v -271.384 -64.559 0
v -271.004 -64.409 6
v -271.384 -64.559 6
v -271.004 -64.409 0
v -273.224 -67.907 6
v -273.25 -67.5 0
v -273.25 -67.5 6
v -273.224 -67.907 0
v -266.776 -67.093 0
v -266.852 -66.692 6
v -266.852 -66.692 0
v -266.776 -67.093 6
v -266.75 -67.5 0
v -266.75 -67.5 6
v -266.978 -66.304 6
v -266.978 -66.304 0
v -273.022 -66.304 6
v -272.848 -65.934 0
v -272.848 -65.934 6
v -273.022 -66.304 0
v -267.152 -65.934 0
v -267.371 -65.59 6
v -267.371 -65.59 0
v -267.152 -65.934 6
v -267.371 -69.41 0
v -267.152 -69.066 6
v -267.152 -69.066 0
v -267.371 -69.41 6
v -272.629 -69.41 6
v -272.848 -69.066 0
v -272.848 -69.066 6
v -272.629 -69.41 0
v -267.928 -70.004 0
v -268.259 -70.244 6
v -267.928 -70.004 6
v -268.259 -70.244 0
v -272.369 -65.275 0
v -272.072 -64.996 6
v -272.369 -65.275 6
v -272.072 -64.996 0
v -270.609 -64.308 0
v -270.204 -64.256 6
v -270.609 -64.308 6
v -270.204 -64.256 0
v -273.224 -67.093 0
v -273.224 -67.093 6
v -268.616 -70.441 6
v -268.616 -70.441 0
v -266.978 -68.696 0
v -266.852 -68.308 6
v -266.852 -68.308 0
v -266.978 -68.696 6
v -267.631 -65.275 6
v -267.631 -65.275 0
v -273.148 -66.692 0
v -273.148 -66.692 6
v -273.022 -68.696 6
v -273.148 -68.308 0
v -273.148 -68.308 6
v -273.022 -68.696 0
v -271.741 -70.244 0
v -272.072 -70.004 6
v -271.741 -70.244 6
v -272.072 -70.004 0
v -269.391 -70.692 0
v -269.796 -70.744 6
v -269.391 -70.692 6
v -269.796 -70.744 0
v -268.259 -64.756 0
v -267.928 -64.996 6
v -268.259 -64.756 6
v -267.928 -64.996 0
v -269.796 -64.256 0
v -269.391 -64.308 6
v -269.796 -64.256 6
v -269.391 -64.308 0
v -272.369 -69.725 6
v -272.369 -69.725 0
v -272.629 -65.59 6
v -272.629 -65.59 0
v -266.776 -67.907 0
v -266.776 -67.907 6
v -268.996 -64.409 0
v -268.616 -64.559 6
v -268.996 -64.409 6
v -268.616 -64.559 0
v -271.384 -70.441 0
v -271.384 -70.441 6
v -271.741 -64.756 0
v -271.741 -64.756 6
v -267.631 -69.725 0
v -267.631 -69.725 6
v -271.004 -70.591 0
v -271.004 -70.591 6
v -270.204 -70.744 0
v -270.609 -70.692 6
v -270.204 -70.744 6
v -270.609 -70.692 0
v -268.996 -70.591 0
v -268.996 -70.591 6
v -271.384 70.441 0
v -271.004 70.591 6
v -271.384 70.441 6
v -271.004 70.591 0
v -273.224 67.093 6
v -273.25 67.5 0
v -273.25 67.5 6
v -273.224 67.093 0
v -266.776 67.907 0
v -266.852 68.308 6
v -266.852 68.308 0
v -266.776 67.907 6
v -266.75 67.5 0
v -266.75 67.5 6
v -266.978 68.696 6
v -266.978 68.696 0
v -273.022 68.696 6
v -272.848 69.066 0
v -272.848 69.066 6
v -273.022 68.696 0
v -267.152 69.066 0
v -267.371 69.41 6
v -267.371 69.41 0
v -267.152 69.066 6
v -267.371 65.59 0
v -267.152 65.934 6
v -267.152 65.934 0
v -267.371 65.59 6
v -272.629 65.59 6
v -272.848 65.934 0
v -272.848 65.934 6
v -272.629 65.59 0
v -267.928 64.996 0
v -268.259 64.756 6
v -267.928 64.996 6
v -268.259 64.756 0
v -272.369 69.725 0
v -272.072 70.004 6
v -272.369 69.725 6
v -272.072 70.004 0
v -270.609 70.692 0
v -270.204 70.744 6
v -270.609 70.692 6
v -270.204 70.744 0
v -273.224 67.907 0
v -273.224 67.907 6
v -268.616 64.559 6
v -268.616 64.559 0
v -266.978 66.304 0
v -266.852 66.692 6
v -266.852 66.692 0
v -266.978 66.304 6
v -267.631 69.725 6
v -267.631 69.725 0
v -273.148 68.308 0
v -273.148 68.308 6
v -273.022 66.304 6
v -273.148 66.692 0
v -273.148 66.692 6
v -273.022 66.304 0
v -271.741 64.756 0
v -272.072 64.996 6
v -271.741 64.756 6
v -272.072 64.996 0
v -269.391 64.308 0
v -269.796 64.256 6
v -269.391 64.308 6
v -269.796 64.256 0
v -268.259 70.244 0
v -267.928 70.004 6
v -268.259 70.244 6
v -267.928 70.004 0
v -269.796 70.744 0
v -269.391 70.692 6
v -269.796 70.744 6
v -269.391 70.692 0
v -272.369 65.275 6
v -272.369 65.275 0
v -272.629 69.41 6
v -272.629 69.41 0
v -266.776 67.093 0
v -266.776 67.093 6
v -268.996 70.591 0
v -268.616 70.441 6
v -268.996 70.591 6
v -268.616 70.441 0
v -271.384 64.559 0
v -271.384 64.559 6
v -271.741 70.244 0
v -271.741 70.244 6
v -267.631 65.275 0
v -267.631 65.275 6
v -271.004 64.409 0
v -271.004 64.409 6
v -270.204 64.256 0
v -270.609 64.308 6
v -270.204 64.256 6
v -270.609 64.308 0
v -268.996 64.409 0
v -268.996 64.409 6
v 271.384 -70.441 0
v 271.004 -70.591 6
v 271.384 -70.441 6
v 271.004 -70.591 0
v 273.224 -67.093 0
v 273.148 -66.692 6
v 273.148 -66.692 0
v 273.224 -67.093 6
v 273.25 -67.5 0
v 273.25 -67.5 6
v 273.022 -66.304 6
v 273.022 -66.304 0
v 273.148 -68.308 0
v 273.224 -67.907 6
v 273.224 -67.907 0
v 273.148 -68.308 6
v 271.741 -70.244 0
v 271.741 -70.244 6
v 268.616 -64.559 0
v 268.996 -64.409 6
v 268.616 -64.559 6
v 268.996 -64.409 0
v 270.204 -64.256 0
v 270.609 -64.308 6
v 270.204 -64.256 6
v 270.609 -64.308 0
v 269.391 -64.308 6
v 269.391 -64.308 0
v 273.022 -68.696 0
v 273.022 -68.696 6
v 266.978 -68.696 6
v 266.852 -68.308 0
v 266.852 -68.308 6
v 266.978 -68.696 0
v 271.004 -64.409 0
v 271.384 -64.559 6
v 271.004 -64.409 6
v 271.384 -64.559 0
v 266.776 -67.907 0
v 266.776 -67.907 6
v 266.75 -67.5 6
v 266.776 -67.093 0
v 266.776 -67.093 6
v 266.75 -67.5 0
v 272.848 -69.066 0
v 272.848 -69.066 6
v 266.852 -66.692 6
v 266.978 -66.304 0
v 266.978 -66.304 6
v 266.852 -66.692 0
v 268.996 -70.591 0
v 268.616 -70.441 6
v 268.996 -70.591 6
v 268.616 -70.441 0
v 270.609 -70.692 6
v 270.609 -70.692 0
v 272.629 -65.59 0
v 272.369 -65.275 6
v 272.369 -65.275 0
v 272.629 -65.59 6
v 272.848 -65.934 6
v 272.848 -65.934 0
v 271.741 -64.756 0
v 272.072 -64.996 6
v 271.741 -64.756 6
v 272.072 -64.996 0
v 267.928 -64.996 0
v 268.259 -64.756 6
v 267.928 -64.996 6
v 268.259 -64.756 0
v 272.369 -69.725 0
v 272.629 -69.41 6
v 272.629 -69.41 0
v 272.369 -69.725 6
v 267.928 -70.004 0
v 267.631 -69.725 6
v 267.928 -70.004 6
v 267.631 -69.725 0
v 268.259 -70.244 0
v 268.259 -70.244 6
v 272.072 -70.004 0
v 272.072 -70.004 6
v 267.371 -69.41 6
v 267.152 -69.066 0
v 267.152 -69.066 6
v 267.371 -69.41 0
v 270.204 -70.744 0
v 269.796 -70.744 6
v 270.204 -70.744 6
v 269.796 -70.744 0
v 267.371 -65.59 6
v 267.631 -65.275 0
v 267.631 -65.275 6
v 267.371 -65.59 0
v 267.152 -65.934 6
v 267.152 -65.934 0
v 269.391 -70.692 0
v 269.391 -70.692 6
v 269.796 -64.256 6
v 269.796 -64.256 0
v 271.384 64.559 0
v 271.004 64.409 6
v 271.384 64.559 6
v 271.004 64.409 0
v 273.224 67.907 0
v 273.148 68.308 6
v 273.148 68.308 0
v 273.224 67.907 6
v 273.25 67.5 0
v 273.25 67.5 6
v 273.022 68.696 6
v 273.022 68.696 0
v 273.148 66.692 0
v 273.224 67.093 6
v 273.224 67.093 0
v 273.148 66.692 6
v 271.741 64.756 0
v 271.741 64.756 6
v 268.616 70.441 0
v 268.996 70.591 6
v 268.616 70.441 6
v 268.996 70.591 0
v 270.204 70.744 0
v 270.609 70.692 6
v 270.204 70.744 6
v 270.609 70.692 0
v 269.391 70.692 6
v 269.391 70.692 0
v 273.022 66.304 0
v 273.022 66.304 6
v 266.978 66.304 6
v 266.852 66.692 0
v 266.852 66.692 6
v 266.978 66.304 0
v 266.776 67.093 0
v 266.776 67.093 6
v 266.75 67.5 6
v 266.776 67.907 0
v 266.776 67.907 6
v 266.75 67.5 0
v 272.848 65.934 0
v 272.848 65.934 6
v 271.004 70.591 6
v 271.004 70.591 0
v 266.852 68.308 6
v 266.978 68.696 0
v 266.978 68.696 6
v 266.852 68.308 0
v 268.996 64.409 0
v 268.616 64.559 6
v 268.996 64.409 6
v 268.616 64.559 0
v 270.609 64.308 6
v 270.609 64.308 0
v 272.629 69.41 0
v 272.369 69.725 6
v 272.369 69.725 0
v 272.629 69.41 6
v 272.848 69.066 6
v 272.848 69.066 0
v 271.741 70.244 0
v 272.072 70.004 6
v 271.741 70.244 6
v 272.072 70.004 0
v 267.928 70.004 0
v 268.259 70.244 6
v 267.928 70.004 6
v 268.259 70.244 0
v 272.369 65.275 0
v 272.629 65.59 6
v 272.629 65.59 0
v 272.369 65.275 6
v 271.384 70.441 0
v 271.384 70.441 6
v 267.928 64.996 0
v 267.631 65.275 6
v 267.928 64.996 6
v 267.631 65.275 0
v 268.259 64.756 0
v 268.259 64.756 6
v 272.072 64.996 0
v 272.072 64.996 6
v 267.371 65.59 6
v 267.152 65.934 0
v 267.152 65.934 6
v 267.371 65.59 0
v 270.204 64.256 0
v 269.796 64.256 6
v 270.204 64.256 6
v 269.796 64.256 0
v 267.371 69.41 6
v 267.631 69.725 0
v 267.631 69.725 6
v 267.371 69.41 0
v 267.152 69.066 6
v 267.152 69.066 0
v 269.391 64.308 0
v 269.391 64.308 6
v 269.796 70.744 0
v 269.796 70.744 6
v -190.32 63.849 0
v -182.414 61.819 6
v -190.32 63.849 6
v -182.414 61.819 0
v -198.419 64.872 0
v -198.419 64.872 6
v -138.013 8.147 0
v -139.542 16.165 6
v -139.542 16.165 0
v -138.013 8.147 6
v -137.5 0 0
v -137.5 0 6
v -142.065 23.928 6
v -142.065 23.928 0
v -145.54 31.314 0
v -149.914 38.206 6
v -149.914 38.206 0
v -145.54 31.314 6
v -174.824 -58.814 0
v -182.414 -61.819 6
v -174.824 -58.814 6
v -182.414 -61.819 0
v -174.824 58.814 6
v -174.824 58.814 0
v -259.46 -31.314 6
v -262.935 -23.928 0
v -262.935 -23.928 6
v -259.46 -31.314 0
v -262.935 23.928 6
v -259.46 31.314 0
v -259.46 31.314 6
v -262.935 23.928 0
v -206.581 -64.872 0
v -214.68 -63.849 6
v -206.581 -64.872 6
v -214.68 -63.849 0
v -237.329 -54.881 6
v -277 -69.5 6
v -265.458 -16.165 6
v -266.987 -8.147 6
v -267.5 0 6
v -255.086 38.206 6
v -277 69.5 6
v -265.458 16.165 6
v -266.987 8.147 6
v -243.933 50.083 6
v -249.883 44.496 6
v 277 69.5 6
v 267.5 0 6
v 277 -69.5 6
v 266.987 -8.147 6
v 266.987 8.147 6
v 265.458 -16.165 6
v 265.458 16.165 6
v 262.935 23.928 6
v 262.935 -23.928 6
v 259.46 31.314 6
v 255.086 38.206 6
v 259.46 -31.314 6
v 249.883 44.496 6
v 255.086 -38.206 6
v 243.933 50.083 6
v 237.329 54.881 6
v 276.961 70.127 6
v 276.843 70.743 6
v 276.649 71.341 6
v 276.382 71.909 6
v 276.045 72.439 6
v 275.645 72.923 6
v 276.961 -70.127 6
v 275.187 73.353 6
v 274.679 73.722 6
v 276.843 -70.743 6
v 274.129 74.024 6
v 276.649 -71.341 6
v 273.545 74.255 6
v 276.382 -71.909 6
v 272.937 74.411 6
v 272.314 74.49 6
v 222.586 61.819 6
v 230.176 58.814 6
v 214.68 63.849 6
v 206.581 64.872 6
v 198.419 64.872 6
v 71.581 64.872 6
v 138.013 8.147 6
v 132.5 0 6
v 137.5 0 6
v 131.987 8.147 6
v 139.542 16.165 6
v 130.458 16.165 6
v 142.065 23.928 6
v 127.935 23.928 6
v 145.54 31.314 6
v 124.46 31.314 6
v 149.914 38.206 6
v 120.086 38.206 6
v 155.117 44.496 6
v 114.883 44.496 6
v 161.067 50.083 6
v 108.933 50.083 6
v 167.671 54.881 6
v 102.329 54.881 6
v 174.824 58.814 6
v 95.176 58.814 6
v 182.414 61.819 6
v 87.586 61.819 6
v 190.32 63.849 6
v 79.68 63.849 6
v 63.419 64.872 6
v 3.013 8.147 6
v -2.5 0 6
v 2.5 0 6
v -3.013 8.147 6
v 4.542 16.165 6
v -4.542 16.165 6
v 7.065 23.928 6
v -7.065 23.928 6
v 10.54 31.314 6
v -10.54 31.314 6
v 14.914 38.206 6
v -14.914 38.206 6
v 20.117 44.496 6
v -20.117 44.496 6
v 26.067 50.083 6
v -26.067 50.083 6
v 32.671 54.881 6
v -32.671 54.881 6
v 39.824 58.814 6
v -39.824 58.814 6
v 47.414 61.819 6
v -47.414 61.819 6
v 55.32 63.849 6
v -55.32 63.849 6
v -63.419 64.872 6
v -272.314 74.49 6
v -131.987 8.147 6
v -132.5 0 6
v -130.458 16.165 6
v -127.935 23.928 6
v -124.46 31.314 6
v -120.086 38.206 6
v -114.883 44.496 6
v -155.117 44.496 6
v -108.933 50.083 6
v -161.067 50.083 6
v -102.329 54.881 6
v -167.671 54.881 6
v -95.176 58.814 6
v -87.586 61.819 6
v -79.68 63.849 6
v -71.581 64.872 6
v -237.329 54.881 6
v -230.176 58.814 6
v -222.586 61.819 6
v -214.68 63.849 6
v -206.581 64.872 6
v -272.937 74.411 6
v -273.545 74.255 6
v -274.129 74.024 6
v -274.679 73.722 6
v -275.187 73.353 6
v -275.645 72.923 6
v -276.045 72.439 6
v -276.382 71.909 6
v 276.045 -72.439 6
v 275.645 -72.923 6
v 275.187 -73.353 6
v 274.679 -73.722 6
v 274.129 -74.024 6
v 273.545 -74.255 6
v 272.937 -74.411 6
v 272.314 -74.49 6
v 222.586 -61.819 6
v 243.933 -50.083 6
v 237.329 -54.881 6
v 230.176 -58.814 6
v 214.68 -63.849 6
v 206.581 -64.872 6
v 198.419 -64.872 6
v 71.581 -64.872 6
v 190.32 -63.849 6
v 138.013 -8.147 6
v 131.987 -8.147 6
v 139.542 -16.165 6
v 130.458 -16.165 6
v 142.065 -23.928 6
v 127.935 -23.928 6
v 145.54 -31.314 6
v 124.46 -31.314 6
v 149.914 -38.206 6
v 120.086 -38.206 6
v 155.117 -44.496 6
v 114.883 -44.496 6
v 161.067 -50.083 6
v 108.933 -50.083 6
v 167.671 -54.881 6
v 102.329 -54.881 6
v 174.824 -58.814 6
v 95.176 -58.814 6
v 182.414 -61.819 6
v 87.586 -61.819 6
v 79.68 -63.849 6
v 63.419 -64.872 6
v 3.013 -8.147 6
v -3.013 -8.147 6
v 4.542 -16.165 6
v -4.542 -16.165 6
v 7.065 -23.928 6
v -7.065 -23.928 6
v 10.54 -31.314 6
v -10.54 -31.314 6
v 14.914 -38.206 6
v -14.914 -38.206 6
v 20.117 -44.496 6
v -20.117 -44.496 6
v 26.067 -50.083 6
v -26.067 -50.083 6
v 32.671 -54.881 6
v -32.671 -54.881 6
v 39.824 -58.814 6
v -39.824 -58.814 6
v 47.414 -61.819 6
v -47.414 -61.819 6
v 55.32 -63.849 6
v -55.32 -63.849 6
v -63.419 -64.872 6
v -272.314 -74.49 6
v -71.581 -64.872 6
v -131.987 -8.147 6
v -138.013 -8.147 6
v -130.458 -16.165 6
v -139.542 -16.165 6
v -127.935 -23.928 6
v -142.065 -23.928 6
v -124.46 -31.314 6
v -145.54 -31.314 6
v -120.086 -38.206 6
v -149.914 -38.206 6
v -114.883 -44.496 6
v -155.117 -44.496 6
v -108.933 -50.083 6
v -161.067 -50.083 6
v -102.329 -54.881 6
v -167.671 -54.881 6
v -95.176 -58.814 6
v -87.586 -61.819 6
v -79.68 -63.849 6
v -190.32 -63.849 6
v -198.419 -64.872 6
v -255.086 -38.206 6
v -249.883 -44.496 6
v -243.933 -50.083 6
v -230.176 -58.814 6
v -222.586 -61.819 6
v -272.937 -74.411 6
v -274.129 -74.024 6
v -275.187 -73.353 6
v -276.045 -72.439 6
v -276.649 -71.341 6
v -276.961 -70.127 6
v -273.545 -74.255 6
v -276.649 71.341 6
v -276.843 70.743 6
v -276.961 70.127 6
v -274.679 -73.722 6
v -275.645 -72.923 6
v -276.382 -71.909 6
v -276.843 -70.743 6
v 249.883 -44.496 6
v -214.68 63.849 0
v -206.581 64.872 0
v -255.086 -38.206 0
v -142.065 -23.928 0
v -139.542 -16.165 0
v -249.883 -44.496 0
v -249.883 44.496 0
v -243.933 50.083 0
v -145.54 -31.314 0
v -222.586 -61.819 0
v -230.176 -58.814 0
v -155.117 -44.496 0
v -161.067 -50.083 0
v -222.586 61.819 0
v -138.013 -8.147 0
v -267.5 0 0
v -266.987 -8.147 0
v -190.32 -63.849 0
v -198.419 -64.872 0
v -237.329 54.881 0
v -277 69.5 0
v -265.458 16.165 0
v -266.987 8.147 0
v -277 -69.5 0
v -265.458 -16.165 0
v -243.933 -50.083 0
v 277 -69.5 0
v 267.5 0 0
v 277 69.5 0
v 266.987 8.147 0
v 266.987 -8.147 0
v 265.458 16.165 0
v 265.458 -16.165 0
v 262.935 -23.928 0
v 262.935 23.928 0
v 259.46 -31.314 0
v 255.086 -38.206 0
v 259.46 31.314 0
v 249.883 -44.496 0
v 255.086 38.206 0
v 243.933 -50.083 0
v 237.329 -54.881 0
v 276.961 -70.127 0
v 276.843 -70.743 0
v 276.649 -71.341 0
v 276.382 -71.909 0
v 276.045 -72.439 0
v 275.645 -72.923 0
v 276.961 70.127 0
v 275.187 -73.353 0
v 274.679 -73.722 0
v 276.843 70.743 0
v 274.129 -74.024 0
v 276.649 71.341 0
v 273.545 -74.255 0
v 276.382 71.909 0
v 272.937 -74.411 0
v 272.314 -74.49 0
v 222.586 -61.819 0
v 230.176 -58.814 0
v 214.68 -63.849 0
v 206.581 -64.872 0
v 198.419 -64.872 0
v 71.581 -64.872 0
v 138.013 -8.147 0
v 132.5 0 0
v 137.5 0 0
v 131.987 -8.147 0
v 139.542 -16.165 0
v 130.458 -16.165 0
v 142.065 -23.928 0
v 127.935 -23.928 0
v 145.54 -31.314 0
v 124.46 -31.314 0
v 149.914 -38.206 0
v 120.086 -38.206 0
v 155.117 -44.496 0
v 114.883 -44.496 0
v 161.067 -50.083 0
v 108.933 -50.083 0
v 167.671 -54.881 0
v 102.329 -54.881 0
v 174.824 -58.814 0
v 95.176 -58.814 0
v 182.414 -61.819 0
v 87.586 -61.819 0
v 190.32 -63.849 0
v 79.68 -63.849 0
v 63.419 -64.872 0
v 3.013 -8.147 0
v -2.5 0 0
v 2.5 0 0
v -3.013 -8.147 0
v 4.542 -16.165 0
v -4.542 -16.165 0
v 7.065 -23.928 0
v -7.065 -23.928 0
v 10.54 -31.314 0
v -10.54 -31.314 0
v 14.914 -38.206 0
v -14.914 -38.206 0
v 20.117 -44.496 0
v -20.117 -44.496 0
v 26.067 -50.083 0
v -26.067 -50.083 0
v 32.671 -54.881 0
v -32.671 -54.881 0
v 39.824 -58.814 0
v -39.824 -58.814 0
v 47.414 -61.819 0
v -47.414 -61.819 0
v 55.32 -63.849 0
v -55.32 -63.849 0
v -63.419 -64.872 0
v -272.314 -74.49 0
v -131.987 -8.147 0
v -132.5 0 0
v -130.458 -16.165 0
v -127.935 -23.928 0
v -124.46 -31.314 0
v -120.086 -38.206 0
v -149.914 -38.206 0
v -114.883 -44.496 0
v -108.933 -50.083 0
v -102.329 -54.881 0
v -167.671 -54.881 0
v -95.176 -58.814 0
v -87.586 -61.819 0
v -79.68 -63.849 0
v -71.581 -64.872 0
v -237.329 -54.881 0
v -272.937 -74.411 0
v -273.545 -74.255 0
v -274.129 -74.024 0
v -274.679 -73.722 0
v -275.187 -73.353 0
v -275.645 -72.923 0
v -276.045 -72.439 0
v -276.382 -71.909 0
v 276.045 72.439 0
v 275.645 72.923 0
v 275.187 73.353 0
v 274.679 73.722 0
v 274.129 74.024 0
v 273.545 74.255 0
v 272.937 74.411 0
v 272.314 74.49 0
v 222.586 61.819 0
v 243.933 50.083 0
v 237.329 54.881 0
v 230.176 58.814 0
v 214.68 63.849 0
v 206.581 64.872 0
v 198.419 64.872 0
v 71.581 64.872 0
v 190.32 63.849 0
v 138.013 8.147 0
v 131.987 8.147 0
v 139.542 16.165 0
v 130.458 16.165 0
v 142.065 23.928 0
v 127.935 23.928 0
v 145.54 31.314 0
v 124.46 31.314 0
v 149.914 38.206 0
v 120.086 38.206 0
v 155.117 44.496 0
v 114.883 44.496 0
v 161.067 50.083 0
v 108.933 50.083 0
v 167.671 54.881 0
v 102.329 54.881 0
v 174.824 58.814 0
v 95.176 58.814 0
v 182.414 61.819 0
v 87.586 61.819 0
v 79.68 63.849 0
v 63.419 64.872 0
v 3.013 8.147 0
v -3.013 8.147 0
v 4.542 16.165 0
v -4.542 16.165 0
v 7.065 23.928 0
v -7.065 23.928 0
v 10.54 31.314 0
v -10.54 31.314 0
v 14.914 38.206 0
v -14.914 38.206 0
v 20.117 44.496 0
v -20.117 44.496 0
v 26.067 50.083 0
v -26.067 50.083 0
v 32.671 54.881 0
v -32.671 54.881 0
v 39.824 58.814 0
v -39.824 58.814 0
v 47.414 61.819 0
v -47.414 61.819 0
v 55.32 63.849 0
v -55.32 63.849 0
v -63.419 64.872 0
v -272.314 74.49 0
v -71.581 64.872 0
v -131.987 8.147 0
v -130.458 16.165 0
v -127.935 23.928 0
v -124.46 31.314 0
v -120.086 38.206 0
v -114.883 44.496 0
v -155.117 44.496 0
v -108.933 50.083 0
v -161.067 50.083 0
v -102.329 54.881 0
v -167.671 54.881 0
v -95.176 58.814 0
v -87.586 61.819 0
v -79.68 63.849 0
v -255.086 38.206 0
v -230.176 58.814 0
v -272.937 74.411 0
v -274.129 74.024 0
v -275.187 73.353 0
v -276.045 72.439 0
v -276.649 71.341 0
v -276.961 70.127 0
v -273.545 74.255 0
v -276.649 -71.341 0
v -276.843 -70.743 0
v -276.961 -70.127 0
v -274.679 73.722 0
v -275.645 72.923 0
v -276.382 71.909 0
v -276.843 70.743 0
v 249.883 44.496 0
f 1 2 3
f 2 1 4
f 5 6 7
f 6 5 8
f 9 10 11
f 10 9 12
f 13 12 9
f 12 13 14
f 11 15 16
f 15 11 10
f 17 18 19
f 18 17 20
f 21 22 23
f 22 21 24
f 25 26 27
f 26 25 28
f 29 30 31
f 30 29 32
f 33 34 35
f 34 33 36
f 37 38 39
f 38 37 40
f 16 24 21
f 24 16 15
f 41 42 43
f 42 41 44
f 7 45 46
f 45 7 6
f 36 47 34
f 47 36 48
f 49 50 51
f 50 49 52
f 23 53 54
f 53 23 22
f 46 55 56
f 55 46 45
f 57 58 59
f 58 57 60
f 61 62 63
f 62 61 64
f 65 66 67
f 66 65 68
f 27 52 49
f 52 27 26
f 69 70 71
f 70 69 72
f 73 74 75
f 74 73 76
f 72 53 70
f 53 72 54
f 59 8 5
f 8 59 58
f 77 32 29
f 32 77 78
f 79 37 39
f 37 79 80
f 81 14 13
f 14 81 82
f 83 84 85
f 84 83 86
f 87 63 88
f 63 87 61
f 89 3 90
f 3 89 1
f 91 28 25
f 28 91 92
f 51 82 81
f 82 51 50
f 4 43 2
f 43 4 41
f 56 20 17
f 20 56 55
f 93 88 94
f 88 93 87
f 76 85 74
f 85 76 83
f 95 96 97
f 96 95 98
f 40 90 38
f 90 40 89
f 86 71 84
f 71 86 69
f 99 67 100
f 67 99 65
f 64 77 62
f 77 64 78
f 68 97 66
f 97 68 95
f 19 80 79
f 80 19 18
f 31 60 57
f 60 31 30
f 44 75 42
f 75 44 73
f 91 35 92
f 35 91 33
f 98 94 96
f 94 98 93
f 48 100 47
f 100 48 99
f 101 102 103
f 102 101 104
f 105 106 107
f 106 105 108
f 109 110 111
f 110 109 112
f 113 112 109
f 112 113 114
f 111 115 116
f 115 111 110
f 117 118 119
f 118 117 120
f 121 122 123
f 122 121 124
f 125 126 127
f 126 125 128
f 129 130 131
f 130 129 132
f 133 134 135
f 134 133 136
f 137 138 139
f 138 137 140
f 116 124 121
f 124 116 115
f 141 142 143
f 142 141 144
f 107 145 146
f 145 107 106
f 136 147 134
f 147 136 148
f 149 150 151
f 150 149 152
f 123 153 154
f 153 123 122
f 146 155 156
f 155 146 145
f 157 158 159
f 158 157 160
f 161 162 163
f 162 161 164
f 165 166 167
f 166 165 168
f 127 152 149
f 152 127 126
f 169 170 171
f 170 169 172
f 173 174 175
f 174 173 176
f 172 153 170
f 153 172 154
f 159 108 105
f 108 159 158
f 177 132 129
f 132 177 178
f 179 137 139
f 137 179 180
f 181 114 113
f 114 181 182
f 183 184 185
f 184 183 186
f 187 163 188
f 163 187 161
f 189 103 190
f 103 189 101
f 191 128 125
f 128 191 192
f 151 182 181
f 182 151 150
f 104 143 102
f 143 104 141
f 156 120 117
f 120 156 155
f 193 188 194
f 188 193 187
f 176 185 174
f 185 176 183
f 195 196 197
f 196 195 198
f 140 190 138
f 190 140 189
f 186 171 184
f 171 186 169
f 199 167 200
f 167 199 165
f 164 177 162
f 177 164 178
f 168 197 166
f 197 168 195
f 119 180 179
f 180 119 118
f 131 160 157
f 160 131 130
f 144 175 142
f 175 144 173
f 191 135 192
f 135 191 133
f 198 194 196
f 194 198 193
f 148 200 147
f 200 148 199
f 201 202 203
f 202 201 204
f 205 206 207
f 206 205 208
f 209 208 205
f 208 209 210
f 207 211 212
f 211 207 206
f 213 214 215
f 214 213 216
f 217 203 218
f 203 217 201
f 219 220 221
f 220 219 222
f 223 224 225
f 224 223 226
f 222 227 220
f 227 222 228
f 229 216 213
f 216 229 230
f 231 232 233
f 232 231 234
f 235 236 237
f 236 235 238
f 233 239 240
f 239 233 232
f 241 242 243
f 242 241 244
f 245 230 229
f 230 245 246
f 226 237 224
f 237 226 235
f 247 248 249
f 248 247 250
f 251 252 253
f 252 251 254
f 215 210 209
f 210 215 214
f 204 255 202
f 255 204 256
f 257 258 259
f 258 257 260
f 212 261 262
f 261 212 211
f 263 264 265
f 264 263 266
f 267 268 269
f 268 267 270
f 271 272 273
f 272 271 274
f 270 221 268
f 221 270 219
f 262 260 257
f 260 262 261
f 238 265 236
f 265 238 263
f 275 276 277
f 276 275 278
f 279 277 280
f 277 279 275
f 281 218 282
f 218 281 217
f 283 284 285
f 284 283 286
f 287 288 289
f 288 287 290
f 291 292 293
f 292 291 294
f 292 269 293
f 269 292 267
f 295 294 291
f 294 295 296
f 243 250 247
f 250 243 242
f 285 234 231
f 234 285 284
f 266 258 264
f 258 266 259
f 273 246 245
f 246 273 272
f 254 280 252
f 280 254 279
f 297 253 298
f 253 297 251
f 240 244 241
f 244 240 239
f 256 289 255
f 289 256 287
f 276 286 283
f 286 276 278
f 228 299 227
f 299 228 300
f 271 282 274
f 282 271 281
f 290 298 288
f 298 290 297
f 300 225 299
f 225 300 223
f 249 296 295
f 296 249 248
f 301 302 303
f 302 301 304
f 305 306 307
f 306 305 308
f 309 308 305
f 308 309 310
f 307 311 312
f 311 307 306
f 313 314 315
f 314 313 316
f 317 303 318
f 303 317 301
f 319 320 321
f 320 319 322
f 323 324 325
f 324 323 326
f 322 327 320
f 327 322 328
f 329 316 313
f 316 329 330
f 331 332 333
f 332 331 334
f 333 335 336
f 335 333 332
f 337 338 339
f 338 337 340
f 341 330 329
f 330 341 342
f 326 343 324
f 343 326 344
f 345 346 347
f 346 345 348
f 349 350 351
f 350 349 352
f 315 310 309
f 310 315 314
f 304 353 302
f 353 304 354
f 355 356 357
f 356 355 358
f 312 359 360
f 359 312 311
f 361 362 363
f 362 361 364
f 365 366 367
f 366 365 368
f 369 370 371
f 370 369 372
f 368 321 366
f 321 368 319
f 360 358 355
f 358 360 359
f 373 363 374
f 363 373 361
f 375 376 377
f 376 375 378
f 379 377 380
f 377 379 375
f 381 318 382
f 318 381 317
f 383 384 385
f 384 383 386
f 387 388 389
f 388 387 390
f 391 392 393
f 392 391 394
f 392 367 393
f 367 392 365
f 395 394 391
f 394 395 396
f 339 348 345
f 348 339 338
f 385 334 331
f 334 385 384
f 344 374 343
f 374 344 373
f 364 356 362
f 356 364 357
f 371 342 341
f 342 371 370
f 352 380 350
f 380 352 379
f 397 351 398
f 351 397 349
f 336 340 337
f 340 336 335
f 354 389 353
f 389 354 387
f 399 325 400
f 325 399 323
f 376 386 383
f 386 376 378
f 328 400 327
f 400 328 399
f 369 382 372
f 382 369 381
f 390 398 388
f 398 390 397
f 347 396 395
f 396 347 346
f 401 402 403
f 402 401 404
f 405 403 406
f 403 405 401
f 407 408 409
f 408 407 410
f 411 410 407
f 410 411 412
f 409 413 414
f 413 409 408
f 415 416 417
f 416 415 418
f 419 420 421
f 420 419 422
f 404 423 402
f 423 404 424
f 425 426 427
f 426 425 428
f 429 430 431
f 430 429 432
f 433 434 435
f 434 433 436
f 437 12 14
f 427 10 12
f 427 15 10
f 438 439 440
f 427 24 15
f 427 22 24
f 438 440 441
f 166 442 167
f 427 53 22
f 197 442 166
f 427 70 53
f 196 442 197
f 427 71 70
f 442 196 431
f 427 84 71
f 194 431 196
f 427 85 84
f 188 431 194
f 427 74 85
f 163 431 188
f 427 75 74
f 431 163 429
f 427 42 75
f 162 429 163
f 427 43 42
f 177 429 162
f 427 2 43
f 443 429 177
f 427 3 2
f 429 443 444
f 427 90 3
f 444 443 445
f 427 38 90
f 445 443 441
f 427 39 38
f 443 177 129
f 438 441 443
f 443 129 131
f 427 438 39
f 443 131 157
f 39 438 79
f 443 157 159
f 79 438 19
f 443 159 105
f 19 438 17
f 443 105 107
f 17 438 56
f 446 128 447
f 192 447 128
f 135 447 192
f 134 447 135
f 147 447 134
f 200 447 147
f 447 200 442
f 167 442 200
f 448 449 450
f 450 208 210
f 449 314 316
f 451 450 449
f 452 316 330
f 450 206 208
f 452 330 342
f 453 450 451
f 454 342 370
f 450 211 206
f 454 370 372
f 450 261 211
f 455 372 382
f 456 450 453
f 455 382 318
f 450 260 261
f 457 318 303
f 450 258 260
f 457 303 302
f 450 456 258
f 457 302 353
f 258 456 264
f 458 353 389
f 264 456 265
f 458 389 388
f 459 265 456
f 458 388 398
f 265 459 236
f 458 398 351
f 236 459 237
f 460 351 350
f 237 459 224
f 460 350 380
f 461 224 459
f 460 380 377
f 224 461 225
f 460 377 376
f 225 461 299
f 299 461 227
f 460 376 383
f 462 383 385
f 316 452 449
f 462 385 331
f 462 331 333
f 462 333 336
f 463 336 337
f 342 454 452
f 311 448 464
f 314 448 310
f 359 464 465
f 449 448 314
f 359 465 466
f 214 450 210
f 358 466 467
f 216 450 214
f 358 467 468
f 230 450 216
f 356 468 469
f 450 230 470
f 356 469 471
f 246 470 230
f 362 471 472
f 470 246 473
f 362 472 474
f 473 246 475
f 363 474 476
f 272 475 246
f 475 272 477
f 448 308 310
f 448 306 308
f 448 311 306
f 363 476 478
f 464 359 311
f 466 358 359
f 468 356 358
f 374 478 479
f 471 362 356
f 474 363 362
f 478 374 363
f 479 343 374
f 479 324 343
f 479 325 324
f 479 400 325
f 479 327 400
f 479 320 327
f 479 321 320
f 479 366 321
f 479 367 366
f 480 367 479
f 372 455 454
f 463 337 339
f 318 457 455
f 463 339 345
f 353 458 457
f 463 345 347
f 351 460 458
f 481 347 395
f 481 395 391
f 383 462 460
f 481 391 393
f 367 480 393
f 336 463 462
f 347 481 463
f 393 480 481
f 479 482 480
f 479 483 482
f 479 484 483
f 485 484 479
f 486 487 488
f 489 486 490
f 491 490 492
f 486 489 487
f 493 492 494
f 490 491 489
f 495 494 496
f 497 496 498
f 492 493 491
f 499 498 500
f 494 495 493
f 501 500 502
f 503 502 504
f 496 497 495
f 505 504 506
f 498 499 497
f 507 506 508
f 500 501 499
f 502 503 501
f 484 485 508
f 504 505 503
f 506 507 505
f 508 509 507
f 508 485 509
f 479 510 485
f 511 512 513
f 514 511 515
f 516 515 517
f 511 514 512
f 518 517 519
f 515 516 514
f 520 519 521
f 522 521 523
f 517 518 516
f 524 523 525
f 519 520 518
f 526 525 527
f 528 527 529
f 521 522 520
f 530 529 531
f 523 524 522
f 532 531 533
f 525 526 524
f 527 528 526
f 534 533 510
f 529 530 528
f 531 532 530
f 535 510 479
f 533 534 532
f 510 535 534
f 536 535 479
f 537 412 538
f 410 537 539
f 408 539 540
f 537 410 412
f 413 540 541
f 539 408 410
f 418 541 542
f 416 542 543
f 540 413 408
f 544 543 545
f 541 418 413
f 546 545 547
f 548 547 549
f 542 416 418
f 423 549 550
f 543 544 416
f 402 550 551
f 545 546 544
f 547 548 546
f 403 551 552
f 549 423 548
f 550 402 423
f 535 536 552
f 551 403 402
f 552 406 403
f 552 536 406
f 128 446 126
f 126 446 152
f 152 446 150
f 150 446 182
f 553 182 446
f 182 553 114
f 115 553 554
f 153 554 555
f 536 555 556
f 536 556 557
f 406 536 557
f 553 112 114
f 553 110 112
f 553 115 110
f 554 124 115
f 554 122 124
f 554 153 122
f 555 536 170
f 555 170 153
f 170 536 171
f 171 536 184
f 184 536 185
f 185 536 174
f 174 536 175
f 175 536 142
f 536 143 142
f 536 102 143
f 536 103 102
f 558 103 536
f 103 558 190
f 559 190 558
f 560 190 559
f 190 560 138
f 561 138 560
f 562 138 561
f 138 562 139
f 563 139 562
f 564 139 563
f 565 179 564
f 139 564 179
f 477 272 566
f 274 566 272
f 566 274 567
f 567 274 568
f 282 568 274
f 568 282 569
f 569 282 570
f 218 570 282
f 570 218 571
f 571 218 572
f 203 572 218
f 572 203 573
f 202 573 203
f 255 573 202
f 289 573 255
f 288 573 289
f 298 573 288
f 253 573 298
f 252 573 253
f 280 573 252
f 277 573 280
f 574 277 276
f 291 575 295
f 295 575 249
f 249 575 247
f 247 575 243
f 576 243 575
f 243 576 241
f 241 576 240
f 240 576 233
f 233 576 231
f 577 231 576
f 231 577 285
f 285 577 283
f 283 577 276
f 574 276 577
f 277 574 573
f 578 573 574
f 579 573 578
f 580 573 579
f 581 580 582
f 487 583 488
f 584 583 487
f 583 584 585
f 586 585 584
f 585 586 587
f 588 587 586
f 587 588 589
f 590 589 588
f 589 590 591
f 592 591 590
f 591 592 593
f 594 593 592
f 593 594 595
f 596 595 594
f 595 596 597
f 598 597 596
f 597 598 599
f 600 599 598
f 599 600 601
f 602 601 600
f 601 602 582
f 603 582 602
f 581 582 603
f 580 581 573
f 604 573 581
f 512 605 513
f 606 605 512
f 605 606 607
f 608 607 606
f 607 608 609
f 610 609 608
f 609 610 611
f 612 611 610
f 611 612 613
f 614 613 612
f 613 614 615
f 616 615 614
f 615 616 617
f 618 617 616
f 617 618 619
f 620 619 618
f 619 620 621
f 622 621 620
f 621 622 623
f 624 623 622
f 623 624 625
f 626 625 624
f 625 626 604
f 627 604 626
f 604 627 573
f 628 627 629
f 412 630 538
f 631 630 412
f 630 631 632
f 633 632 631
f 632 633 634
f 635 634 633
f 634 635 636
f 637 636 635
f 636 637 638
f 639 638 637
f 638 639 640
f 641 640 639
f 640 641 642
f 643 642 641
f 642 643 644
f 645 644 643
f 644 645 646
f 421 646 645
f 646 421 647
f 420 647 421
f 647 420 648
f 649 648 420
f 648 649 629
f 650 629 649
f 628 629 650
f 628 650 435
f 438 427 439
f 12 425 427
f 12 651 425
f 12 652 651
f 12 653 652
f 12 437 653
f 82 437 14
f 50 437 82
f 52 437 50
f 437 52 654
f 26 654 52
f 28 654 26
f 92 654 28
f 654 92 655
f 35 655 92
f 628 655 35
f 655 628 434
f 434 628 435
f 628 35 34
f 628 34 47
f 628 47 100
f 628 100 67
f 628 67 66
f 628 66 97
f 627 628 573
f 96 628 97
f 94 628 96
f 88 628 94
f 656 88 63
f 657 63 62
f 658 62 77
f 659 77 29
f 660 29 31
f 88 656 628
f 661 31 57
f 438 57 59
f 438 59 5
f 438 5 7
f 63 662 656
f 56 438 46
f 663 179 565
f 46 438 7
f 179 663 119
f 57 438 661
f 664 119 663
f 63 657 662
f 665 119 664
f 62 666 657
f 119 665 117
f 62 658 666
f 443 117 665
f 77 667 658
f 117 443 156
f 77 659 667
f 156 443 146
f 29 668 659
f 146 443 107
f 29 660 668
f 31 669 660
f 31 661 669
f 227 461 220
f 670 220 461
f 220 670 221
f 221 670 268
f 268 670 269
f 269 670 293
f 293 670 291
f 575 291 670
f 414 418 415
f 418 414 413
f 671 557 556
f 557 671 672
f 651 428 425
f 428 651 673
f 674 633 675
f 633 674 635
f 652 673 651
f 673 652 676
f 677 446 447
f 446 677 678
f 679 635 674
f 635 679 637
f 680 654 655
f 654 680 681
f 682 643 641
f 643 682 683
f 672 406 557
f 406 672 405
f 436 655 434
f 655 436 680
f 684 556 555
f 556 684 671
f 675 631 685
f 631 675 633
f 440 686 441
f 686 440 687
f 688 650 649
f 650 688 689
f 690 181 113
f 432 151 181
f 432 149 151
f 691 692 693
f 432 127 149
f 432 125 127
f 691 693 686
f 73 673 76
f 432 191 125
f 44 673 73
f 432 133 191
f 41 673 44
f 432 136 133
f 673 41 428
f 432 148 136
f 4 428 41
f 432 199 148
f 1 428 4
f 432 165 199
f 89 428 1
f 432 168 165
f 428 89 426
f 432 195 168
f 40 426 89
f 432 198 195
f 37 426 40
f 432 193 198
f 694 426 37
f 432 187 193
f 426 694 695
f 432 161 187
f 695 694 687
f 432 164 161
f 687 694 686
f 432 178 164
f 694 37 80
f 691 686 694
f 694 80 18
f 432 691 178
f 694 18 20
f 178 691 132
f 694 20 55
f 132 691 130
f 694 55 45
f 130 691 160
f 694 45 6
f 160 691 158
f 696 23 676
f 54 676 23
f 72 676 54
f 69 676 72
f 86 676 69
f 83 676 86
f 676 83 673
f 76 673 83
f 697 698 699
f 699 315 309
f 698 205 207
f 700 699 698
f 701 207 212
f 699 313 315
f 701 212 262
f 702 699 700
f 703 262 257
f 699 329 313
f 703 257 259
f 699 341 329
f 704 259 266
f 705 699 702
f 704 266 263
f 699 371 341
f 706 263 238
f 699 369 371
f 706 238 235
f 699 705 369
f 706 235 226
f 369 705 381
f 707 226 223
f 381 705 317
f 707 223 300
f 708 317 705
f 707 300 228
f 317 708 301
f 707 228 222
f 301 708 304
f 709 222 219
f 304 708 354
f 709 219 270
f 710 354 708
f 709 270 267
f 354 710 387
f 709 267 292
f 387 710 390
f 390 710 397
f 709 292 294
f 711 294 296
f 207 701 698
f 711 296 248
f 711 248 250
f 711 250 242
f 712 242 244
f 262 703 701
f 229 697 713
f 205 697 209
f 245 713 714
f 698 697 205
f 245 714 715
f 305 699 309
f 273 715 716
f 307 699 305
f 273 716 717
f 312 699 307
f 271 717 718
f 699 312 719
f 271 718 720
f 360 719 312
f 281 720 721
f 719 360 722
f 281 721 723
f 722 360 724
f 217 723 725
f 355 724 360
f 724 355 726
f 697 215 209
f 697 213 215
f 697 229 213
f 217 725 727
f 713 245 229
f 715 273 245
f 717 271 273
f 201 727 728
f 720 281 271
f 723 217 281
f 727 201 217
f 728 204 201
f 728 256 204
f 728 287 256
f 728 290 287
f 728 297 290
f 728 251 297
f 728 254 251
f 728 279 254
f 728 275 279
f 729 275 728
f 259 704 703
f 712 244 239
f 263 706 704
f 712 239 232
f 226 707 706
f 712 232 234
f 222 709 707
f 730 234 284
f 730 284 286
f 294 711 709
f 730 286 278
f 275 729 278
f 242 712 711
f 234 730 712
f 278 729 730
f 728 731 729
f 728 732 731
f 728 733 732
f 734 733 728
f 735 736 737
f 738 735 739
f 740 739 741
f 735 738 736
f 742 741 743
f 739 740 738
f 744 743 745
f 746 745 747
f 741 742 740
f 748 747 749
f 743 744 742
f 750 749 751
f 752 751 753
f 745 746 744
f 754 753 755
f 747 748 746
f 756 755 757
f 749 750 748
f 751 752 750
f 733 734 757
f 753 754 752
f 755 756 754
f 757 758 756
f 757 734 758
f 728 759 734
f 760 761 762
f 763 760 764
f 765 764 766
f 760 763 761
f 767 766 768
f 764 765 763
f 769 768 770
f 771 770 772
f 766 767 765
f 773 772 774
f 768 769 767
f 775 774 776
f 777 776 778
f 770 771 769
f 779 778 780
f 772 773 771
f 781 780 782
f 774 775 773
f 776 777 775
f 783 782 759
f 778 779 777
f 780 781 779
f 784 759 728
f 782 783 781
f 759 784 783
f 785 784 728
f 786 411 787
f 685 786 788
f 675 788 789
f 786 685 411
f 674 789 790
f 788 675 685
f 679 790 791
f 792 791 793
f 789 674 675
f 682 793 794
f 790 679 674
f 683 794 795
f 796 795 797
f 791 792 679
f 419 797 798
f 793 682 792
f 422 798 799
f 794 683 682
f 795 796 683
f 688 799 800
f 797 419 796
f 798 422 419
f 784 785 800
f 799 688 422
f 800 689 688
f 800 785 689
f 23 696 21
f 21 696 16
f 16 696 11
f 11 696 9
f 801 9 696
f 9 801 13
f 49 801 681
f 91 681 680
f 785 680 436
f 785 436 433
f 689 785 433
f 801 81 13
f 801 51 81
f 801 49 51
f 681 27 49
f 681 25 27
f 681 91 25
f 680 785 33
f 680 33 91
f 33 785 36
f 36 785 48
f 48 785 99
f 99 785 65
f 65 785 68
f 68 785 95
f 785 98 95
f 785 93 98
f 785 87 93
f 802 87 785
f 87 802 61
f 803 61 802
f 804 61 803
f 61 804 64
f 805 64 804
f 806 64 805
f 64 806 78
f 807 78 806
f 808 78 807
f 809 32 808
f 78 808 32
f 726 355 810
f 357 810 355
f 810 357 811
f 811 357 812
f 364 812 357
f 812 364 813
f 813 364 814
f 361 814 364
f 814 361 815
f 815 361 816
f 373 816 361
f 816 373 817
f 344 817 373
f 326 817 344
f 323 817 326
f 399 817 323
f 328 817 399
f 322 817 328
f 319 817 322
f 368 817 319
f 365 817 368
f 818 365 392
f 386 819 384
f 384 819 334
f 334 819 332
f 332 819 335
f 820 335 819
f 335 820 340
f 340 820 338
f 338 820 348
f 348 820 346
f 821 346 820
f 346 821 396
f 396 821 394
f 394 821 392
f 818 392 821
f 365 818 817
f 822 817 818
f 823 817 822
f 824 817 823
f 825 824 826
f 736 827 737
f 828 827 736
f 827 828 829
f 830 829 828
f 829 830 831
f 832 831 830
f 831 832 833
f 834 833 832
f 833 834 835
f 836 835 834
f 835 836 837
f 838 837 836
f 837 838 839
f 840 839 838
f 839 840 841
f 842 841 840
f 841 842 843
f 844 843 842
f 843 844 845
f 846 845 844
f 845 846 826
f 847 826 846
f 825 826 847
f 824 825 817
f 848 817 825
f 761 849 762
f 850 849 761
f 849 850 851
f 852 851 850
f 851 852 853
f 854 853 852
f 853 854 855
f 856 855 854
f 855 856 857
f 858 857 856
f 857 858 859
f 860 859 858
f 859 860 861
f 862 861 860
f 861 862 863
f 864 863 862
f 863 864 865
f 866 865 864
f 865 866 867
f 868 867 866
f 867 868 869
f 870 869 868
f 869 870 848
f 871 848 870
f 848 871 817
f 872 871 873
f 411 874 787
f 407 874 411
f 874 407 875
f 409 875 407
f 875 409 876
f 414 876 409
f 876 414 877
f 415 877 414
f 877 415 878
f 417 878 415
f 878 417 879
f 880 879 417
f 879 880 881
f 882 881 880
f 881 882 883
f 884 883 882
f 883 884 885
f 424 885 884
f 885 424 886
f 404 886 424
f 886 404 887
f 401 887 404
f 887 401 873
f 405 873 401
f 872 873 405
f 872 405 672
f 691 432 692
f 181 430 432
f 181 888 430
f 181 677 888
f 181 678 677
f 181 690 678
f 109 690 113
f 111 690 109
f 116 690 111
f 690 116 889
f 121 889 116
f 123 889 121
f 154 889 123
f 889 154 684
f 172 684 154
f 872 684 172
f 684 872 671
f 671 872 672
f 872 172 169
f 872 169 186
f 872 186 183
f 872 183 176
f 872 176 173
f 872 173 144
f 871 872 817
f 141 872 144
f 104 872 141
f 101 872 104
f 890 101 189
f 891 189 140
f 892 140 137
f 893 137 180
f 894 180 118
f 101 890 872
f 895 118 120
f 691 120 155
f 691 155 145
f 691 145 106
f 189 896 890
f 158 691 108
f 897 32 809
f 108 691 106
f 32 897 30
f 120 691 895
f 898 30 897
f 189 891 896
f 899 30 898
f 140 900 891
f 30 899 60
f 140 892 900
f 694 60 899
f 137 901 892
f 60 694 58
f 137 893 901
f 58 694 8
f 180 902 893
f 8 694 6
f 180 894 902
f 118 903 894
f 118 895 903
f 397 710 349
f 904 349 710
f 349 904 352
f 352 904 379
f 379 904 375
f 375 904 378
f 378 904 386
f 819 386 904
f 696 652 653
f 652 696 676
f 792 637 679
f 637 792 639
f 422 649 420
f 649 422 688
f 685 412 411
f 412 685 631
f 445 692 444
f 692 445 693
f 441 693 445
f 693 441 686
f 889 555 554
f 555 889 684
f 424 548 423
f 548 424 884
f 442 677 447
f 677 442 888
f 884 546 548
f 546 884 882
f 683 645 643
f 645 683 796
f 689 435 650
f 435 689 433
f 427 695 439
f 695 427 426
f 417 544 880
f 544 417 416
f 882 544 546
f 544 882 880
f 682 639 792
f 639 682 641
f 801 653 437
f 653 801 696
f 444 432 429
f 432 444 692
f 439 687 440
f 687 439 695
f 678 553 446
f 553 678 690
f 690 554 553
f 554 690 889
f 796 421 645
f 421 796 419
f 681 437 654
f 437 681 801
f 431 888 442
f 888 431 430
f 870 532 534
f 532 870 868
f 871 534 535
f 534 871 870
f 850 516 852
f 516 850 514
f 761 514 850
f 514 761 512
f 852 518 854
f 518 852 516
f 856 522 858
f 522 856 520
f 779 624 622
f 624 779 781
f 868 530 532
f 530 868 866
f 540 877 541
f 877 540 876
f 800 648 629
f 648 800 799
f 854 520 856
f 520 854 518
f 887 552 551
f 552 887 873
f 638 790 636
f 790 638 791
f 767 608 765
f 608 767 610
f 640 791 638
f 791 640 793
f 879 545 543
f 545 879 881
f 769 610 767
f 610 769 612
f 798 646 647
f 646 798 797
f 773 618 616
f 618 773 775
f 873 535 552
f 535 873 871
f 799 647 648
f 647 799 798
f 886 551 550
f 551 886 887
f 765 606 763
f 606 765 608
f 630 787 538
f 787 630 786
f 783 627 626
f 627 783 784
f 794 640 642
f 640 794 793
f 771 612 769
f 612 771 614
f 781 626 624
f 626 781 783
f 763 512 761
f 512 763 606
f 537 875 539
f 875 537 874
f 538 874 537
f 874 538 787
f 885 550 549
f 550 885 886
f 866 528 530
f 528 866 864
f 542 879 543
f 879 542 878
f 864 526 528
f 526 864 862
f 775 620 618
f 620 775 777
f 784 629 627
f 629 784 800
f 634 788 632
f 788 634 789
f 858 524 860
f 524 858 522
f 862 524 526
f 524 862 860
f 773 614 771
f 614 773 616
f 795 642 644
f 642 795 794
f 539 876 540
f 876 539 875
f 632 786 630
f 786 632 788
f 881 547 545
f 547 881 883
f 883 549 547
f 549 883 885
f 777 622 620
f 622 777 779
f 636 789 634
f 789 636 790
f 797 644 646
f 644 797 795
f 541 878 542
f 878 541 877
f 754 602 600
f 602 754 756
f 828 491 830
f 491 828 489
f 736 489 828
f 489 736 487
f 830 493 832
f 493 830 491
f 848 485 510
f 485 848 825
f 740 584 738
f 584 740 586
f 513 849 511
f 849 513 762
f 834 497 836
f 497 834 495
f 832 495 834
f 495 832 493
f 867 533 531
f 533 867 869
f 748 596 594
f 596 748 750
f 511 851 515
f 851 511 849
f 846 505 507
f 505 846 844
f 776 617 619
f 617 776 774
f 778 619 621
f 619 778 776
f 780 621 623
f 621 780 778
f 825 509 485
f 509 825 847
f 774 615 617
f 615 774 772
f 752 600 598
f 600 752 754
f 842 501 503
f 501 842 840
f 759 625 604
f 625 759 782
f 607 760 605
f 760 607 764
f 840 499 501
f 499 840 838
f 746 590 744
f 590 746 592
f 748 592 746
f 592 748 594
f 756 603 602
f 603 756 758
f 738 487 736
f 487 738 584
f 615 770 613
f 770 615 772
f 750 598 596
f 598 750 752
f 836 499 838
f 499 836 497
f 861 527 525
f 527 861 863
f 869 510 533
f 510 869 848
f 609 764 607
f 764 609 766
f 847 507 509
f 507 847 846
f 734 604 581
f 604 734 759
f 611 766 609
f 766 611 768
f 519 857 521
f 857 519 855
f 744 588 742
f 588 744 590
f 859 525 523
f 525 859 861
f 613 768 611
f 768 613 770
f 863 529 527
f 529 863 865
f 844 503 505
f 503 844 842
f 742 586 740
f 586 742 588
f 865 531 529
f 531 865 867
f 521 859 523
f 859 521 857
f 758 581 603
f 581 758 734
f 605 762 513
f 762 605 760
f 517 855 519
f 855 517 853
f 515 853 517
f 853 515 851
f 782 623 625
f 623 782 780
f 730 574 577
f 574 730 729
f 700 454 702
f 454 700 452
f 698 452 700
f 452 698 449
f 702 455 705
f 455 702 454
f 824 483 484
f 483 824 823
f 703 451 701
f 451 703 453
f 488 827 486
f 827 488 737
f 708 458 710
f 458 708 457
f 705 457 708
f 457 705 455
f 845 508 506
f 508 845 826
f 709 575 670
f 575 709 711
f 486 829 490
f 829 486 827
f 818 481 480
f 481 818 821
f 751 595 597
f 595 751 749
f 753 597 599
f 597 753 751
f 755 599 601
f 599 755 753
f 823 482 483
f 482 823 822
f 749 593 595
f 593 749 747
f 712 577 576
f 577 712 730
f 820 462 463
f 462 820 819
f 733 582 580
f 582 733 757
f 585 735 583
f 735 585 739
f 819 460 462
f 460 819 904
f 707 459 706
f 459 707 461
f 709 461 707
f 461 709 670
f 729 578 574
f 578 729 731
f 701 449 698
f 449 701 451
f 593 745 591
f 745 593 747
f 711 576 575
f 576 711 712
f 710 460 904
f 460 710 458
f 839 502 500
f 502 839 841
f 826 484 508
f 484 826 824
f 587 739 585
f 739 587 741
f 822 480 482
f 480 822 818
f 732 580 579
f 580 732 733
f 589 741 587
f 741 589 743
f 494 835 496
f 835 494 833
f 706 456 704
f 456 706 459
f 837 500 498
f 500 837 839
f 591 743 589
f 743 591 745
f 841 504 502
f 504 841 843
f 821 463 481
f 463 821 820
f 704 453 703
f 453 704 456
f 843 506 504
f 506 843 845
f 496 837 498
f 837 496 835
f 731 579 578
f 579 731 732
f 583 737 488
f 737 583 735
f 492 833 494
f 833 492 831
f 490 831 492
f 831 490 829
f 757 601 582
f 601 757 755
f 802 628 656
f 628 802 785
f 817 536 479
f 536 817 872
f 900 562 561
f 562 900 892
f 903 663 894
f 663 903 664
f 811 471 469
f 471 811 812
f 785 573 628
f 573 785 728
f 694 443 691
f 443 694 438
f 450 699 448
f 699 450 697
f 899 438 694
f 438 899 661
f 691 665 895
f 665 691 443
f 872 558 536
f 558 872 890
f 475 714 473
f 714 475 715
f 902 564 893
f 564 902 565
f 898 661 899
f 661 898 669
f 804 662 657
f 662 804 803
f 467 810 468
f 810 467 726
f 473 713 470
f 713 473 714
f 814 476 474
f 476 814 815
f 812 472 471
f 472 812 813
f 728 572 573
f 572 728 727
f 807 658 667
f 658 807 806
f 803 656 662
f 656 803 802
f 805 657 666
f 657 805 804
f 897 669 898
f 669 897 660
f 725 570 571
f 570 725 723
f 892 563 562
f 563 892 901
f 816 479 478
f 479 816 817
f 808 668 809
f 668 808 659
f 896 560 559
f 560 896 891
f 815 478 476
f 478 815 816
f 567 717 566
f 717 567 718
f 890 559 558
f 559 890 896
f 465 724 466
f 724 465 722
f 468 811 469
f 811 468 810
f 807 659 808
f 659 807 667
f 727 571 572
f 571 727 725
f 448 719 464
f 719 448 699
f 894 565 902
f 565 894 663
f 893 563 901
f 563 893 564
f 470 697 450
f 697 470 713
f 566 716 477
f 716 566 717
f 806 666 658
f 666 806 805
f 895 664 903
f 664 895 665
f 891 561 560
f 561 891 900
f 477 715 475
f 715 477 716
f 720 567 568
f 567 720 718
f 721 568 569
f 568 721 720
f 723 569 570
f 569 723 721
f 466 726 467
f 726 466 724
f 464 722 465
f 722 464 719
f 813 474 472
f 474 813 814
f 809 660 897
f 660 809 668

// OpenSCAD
$fn = 50;

difference() {
	union() {
		hull() {
			translate(v = [-272.0, 69.5, 0]) {
				cylinder(h = 6, r = 5);
			}
			translate(v = [272.0, 69.5, 0]) {
				cylinder(h = 6, r = 5);
			}
			translate(v = [-272.0, -69.5, 0]) {
				cylinder(h = 6, r = 5);
			}
			translate(v = [272.0, -69.5, 0]) {
				cylinder(h = 6, r = 5);
			}
		}
	}
	union() {
		translate(v = [-270.0, -67.5, -100.0]) {
			cylinder(h = 200, r = 3.25);
		}
		translate(v = [-270.0, 67.5, -100.0]) {
			cylinder(h = 200, r = 3.25);
		}
		translate(v = [270.0, -67.5, -100.0]) {
			cylinder(h = 200, r = 3.25);
		}
		translate(v = [270.0, 67.5, -100.0]) {
			cylinder(h = 200, r = 3.25);
		}
		translate(v = [-270.0, -67.5, -100.0]) {
			cylinder(h = 200, r = 1.8);
		}
		translate(v = [-270.0, 67.5, -100.0]) {
			cylinder(h = 200, r = 1.8);
		}
		translate(v = [270.0, -67.5, -100.0]) {
			cylinder(h = 200, r = 1.8);
		}
		translate(v = [270.0, 67.5, -100.0]) {
			cylinder(h = 200, r = 1.8);
		}
		translate(v = [-202.5, 0, 0.0]) {
			cylinder(h = 6, r = 65.0);
		}
		translate(v = [-67.5, 0, 0.0]) {
			cylinder(h = 6, r = 65.0);
		}
		translate(v = [67.5, 0, 0.0]) {
			cylinder(h = 6, r = 65.0);
		}
		translate(v = [202.5, 0, 0.0]) {
			cylinder(h = 6, r = 65.0);
		}
	}
}
